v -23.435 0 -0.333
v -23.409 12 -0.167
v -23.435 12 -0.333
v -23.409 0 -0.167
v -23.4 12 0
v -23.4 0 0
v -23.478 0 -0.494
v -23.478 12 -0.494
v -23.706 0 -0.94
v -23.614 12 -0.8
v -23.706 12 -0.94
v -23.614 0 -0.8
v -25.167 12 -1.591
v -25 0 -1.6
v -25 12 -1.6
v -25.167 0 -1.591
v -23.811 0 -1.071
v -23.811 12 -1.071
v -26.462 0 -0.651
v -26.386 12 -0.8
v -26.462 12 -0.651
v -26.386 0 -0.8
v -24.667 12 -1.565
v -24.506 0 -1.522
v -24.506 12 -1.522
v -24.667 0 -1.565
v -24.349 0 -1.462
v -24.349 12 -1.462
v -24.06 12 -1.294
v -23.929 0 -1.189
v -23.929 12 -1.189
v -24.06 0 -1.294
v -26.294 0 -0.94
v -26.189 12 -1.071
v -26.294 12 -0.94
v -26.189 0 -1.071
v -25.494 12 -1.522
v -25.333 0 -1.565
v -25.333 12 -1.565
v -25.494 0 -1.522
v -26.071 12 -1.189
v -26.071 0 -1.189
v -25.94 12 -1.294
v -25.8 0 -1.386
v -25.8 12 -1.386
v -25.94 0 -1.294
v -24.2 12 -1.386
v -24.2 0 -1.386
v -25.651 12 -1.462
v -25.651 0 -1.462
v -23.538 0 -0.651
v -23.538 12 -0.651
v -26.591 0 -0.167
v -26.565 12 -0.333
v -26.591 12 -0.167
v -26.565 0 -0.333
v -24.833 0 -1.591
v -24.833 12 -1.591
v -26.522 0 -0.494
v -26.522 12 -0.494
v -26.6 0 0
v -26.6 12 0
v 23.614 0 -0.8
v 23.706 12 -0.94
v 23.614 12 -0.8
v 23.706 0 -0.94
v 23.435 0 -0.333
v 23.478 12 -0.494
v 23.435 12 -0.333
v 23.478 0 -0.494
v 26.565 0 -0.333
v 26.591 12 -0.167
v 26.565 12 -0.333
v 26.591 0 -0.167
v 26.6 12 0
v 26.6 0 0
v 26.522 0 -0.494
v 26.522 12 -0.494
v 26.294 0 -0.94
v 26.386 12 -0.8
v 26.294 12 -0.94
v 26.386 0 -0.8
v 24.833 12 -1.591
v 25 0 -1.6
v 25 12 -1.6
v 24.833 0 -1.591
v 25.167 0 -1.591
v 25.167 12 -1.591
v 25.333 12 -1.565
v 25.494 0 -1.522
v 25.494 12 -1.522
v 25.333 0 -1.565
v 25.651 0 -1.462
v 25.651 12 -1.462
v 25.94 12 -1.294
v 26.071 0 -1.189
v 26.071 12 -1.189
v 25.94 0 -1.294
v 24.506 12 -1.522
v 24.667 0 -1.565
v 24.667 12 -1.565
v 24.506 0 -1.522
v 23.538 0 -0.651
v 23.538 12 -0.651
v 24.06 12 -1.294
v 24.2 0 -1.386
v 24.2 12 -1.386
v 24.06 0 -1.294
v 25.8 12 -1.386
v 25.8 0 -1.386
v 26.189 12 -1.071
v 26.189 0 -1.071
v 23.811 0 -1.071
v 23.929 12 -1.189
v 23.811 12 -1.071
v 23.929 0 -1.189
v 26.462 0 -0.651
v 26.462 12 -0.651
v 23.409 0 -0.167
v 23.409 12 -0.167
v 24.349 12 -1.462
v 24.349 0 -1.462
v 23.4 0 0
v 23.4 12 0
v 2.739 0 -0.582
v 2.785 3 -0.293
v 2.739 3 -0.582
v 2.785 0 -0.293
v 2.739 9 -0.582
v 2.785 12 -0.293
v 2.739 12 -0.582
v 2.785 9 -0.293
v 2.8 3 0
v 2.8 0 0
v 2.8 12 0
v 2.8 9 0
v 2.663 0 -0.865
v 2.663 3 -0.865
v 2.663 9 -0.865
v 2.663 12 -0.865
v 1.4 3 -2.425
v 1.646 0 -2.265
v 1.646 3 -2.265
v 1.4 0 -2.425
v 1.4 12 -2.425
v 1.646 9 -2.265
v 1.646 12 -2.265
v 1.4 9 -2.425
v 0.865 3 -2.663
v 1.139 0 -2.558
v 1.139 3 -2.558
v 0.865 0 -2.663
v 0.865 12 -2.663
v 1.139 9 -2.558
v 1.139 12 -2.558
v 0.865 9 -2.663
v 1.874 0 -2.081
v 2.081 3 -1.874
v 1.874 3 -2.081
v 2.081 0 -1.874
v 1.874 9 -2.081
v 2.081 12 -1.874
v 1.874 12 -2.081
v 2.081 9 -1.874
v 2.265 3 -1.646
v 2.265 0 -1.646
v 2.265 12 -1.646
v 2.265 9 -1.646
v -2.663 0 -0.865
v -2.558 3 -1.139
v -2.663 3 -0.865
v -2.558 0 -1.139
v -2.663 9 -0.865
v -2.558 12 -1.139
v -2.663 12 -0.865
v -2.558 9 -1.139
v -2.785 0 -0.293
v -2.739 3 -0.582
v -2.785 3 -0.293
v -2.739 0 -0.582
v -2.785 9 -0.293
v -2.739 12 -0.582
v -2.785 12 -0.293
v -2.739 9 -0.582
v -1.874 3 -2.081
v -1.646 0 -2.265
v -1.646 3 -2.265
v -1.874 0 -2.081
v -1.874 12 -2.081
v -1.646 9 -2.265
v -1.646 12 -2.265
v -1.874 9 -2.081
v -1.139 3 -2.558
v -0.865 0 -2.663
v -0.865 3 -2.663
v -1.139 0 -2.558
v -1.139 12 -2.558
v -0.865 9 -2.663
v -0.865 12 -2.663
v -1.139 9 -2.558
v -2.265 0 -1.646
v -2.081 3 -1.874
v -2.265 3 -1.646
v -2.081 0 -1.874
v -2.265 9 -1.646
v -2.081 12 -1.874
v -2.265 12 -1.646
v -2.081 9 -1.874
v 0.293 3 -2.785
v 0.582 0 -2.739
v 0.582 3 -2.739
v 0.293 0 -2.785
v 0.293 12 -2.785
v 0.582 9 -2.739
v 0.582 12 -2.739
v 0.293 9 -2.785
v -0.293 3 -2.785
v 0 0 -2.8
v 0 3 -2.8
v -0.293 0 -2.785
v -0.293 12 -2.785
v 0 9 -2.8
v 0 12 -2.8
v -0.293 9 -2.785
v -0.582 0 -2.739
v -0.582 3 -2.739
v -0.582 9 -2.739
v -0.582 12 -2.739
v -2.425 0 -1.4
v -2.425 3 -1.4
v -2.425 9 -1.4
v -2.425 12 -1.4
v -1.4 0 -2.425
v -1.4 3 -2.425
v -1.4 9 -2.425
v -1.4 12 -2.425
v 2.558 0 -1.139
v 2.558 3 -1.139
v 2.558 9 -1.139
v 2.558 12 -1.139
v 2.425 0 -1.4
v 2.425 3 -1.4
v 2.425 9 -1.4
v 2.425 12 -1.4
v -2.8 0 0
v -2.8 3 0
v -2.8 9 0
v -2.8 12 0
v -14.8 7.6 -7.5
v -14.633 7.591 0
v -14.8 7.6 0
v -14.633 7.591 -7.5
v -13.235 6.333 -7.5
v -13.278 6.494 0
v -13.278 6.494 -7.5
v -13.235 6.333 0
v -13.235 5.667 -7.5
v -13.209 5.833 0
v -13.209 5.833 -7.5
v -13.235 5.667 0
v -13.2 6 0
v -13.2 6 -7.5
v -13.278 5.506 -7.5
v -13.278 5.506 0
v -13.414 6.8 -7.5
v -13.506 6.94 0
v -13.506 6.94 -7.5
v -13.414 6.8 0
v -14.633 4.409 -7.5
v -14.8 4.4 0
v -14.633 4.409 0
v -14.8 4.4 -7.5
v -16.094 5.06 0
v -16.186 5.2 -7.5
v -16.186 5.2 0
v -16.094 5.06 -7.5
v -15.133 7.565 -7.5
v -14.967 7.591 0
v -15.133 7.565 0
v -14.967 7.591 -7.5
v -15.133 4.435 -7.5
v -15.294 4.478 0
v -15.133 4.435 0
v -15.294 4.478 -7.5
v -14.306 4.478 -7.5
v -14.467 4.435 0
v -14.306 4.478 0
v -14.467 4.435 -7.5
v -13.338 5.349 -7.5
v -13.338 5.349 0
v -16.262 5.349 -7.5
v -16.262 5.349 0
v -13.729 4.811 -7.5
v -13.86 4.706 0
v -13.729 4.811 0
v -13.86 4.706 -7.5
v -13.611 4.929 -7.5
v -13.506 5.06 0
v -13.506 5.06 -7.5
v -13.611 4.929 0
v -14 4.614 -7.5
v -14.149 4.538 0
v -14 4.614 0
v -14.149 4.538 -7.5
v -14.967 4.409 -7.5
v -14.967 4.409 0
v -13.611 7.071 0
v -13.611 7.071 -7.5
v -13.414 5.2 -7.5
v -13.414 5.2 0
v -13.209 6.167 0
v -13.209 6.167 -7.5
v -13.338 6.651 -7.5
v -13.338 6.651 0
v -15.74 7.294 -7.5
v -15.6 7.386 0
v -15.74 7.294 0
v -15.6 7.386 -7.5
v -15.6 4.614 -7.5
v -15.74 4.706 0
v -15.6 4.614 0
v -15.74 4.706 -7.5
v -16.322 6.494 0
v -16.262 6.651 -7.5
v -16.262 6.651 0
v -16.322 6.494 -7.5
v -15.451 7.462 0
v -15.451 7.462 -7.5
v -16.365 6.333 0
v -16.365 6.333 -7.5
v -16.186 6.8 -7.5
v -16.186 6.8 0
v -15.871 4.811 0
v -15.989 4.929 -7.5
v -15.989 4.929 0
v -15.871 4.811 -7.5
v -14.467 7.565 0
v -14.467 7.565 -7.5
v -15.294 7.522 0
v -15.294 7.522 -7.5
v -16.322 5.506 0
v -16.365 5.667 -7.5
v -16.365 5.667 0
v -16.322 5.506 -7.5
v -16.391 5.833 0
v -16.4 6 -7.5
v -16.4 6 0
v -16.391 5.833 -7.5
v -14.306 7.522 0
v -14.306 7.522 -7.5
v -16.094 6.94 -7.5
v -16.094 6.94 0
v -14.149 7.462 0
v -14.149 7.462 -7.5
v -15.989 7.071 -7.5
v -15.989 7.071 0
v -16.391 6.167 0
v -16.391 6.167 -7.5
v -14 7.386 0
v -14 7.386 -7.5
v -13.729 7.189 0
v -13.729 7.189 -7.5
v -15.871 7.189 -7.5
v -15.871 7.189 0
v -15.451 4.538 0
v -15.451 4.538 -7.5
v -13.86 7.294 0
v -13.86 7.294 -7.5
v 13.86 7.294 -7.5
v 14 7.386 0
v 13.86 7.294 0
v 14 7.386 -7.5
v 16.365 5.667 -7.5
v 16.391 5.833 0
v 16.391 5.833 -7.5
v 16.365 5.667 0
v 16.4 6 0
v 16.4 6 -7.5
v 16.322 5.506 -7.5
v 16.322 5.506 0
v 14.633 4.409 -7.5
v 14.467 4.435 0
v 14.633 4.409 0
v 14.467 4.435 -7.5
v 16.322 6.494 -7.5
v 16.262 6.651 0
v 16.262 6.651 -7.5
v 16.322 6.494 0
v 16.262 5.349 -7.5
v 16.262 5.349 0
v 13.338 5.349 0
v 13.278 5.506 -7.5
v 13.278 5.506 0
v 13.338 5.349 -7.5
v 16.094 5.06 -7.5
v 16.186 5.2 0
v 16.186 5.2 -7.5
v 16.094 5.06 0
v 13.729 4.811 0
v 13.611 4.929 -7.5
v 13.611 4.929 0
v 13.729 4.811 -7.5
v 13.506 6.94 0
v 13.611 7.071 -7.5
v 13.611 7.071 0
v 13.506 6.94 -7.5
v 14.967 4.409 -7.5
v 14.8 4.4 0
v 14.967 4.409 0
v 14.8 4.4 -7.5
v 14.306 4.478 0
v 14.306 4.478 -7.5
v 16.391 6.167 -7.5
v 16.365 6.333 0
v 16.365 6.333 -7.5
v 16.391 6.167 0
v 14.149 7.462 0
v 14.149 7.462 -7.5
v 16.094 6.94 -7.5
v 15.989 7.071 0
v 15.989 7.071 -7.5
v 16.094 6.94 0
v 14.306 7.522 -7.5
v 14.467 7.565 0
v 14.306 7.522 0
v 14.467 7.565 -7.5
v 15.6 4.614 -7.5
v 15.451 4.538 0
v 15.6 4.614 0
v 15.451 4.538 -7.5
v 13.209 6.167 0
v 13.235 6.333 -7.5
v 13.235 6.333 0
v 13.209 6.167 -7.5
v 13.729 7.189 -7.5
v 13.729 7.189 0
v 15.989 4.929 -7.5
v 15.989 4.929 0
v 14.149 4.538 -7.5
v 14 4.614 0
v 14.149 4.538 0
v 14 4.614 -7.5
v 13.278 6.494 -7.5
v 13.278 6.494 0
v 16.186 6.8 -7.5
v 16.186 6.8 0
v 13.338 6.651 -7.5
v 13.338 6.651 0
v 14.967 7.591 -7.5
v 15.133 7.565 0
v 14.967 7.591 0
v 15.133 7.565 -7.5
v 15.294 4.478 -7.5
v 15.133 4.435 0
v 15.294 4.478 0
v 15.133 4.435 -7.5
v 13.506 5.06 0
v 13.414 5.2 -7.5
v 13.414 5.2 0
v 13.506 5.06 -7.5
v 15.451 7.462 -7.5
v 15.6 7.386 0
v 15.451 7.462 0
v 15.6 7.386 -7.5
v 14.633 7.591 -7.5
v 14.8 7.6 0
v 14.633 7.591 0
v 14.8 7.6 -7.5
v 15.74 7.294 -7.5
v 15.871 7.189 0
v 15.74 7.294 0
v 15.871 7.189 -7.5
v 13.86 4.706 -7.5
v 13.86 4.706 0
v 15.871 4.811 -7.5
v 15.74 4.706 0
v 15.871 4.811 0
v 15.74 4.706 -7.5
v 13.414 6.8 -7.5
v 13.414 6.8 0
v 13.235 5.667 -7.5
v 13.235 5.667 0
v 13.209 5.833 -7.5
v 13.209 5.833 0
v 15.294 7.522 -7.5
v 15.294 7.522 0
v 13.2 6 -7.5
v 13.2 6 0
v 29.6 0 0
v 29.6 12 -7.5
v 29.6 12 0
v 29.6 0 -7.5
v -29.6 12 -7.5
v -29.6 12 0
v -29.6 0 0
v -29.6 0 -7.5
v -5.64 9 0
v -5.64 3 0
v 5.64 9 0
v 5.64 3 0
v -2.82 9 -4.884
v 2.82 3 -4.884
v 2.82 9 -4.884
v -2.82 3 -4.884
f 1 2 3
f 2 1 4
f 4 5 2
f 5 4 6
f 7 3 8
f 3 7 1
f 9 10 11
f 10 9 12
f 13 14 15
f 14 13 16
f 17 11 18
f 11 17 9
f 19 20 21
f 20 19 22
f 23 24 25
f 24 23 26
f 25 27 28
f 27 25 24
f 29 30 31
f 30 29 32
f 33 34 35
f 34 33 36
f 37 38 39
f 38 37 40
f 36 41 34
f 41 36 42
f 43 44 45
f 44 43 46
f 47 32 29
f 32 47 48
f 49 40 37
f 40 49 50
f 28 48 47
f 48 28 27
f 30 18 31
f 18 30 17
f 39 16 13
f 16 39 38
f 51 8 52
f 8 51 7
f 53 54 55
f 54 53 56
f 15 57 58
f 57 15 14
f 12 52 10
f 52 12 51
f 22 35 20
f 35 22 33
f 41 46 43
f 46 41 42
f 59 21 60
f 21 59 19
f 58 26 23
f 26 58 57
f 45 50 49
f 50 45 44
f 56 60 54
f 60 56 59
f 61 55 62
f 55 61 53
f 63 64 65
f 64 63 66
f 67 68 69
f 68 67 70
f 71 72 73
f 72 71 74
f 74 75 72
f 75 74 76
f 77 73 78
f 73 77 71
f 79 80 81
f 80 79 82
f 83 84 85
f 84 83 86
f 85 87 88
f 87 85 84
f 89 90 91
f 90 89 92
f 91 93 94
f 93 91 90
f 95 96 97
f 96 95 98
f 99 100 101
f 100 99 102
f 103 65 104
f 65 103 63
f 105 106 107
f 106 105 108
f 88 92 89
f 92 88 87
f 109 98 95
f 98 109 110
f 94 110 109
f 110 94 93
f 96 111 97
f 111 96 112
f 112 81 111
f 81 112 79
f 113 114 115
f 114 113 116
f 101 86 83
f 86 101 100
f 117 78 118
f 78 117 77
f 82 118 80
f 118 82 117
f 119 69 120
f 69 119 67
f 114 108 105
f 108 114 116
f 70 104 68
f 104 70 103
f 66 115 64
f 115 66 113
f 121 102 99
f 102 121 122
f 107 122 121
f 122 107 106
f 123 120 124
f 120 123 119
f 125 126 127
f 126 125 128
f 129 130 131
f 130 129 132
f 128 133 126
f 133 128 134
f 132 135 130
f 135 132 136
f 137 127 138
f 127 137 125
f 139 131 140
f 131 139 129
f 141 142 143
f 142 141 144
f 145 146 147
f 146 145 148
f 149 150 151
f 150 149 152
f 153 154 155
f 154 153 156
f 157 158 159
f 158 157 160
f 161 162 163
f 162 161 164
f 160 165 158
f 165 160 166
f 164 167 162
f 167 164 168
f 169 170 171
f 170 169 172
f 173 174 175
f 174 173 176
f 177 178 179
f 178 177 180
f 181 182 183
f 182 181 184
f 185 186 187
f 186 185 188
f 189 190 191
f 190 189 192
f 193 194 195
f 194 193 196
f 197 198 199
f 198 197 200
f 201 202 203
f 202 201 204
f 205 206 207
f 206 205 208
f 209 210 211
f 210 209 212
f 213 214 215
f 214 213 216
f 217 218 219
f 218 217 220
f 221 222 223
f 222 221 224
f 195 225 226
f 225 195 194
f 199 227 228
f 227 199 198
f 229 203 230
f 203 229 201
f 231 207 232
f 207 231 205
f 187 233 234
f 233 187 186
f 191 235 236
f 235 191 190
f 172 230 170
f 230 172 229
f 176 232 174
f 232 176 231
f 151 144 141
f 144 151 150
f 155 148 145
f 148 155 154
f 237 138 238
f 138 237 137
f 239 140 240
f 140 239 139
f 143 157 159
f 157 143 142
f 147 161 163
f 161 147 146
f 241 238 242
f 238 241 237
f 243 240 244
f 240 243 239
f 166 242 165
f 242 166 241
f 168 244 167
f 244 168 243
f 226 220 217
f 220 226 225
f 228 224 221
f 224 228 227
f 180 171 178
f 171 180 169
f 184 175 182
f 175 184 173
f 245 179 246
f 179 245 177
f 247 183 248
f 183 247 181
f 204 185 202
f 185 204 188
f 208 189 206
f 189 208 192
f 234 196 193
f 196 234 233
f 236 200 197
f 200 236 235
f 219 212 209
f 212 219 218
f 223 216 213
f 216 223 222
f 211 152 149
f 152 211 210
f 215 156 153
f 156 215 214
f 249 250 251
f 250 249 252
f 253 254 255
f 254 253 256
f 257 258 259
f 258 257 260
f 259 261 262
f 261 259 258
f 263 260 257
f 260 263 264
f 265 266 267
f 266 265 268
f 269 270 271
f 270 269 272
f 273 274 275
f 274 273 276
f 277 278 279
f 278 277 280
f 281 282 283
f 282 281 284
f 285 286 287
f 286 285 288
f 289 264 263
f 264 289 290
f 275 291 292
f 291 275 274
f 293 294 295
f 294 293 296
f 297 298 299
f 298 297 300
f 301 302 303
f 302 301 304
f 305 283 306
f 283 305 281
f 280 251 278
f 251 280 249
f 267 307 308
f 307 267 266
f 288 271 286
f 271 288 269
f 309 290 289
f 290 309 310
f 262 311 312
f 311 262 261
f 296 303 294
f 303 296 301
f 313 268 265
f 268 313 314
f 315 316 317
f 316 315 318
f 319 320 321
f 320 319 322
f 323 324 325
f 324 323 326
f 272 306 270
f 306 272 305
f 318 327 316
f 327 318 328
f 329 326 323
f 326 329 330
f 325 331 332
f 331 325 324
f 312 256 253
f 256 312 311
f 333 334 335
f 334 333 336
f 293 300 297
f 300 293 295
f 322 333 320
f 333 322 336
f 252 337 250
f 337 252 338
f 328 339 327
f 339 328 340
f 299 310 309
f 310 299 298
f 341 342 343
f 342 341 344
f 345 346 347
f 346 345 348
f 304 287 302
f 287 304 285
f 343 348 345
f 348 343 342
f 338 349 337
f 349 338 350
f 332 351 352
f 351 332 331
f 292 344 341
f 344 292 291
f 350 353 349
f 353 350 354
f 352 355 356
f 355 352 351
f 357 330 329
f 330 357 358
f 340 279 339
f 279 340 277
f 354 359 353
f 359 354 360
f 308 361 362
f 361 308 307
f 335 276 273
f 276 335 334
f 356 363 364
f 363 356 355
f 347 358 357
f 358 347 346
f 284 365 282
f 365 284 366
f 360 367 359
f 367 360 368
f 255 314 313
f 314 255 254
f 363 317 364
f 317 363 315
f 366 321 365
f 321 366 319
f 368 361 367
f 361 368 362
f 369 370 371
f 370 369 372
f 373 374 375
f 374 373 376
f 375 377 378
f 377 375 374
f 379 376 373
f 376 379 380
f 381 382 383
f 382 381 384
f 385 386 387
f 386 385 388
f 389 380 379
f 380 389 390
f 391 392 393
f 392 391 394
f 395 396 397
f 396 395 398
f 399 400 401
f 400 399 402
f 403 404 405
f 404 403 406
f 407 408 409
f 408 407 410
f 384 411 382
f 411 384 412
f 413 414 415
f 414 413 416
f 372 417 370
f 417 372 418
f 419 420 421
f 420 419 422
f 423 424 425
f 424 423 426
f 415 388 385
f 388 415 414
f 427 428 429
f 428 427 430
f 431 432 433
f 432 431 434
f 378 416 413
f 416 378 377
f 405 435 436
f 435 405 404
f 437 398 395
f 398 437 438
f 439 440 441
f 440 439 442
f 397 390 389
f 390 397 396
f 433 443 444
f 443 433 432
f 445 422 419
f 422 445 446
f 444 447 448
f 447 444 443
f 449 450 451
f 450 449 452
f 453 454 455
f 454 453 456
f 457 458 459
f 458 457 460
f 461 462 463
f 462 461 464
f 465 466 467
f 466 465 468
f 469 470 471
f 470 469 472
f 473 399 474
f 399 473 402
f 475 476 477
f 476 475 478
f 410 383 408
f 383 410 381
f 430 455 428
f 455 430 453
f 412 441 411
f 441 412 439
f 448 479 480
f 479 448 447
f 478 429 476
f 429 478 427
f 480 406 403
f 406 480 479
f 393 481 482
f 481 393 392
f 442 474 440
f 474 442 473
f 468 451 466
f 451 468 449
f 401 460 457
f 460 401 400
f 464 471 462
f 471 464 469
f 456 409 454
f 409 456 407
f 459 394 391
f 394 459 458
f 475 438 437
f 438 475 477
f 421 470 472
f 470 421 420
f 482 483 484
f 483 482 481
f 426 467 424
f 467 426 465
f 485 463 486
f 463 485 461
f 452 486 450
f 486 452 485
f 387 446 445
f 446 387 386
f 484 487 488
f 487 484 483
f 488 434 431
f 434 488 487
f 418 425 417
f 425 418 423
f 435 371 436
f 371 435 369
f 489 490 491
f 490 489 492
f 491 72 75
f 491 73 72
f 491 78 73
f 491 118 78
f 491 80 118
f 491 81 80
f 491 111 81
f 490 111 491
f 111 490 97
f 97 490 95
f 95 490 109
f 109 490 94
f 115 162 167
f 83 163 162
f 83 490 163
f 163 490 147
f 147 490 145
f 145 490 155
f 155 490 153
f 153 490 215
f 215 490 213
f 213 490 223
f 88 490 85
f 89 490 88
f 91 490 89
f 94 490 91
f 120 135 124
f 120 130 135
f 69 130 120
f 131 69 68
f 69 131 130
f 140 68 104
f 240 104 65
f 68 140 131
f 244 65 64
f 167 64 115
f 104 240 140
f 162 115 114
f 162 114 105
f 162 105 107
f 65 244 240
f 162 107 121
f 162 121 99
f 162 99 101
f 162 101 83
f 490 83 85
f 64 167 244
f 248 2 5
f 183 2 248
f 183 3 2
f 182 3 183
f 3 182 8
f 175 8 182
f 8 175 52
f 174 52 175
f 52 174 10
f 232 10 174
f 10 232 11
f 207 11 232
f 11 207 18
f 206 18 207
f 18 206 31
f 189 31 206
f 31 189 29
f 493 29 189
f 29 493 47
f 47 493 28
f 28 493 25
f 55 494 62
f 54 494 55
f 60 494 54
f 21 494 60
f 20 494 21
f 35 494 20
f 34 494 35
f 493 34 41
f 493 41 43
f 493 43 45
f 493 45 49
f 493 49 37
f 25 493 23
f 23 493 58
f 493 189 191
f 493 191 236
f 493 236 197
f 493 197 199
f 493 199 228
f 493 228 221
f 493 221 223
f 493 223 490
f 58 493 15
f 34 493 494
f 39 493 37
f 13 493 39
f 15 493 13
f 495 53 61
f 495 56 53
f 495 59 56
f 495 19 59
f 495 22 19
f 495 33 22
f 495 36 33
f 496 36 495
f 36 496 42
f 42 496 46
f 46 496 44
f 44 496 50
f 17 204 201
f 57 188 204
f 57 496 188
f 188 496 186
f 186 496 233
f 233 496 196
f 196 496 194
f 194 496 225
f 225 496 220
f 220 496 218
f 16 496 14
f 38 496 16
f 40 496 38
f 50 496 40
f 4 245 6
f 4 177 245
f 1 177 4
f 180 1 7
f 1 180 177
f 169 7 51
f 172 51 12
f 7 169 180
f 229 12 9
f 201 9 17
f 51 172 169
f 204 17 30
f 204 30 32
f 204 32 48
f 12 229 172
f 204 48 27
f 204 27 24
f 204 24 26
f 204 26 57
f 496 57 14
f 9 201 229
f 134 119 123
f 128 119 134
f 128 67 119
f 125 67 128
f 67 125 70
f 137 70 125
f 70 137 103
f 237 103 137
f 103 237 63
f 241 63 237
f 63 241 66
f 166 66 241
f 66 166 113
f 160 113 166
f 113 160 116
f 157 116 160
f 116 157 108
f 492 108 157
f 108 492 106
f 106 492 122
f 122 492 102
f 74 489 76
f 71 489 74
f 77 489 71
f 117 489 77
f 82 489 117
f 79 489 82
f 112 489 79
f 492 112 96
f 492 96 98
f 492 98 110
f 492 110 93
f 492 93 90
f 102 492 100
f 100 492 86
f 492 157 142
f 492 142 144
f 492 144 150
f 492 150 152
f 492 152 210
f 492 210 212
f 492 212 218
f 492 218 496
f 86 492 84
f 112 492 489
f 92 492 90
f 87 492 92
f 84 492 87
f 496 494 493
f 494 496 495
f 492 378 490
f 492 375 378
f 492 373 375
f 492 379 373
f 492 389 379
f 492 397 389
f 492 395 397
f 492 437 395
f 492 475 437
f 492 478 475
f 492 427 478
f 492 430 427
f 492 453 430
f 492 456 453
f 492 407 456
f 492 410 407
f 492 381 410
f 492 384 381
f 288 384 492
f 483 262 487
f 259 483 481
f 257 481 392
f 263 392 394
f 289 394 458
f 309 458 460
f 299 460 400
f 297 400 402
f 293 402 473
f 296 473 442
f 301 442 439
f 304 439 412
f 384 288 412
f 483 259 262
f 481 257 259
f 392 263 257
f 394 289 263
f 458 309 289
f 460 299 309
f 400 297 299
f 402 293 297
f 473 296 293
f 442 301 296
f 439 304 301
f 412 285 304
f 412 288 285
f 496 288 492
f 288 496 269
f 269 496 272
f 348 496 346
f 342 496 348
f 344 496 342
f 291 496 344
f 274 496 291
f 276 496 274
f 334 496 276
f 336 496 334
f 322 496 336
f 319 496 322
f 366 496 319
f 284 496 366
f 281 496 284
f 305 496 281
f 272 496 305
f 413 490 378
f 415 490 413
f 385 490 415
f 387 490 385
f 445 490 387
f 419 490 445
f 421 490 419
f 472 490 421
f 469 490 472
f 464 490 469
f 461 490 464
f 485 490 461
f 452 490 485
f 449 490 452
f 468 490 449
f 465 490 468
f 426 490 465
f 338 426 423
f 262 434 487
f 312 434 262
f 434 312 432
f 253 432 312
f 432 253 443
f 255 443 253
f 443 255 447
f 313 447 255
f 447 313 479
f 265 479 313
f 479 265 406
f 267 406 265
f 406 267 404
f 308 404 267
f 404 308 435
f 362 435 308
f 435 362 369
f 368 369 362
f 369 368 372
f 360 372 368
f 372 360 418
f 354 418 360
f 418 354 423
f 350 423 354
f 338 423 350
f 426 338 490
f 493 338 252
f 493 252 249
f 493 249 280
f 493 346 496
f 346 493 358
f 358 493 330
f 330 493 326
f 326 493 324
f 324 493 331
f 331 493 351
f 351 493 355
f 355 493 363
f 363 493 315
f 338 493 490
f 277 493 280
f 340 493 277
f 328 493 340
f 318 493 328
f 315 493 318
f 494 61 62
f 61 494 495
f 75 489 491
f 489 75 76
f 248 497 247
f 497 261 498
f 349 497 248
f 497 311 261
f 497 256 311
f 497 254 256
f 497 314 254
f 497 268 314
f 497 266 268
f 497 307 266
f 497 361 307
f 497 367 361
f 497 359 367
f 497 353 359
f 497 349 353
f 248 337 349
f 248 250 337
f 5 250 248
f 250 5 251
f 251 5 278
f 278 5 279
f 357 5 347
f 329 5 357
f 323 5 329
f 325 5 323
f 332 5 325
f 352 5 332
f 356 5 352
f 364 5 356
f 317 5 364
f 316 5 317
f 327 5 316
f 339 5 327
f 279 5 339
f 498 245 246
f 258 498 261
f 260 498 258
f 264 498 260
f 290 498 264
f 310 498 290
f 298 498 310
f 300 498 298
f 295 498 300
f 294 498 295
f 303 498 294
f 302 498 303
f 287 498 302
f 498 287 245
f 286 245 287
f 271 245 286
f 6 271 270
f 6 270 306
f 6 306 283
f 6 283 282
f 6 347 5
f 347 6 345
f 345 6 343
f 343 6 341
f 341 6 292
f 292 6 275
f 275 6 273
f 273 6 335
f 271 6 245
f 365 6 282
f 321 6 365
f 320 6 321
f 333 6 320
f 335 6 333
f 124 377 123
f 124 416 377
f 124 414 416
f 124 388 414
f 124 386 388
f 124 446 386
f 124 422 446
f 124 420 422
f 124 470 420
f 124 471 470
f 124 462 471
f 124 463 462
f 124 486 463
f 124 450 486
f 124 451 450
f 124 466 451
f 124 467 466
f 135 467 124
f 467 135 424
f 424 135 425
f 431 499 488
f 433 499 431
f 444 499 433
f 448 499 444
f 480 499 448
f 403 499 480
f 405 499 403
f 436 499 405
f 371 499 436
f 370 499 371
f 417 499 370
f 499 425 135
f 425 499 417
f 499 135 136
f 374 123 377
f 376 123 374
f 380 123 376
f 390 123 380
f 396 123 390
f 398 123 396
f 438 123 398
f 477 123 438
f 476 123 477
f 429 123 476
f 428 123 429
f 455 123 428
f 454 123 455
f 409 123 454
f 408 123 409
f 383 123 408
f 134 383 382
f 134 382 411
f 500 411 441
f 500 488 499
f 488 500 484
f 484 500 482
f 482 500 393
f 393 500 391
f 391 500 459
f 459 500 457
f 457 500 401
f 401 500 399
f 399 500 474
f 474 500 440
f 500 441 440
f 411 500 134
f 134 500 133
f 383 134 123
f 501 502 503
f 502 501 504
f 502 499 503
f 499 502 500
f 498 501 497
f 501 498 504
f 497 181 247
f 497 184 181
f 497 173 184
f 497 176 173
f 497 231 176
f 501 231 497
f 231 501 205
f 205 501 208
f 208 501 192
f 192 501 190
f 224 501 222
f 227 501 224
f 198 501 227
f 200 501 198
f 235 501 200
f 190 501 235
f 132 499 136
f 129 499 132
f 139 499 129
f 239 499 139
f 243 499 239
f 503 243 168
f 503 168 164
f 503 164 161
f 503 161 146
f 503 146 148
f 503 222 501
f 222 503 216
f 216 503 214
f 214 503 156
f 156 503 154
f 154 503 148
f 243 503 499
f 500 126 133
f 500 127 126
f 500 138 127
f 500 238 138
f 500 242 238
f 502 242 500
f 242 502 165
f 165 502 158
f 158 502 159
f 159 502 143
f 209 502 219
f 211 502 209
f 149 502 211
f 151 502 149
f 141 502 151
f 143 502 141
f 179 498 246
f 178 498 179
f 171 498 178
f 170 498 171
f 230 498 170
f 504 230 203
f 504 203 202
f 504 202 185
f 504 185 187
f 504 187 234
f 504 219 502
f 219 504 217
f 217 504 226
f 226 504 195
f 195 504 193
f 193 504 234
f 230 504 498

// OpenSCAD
/*
 * bowden extruder mount
 **
 * Serendipitously you can just run an M6 nyloc nut onto the end of the PTFE
 * tube for a perfect grip
 *
 * Copyright 2012 <b@Zi.iS>
 * License CC BY 3.0
 */
$fn = 60;

m3 = 3.2 /2;
m6_nyloc = [
	11.28 /2,
	6
];

rotate([
	-90,
	0,
	0
]) {
	mount();

}

module mount(
	bolt = m3,
	pitch = 50,
	bowden = 5.6/2,
	bowden_nut = m6_nyloc,
	t = 3
) {
	size = [
		pitch + bolt*2 + t*2,
		bowden_nut[1]*2+t,
		bowden_nut[1] + t*2
	];

	difference() {
		translate([
			-size[0]/2,
			0,
			0
		]) {
			cube([
				size[0],
				size[1]/2,
				size[2]
			]);
		}

		//bowden nut	
		translate([
			0,
			0,
			t
		]) {
			cylinder(
				r = bowden_nut[0],
				h = bowden_nut[1],
				$fn = 6
			);
		}
	
		translate([
			0,
			0,
			-1
		]) {

			//bowden
			cylinder(
				r = bowden,
				h = size[2]+2
			);

			//x-carrage bolts
			for(x=[0:1]) {
				translate([
					-pitch/2 + x*pitch,
					0,
					0
				]) {
					cylinder(
						r = bolt,
						h = size[2]+2
					);
				}
			}
		}

		//bolts
		for(x=[0:1]){
			translate([
				-size[0]/4 + size[0]/2*x,
				-1,
				size[2]/2
			]) {
				rotate([
					-90,
					0,
					0
				]) {
					cylinder(
						r = bolt,
						h = size[1]
					);
				}
			}
		}
	}
}	
